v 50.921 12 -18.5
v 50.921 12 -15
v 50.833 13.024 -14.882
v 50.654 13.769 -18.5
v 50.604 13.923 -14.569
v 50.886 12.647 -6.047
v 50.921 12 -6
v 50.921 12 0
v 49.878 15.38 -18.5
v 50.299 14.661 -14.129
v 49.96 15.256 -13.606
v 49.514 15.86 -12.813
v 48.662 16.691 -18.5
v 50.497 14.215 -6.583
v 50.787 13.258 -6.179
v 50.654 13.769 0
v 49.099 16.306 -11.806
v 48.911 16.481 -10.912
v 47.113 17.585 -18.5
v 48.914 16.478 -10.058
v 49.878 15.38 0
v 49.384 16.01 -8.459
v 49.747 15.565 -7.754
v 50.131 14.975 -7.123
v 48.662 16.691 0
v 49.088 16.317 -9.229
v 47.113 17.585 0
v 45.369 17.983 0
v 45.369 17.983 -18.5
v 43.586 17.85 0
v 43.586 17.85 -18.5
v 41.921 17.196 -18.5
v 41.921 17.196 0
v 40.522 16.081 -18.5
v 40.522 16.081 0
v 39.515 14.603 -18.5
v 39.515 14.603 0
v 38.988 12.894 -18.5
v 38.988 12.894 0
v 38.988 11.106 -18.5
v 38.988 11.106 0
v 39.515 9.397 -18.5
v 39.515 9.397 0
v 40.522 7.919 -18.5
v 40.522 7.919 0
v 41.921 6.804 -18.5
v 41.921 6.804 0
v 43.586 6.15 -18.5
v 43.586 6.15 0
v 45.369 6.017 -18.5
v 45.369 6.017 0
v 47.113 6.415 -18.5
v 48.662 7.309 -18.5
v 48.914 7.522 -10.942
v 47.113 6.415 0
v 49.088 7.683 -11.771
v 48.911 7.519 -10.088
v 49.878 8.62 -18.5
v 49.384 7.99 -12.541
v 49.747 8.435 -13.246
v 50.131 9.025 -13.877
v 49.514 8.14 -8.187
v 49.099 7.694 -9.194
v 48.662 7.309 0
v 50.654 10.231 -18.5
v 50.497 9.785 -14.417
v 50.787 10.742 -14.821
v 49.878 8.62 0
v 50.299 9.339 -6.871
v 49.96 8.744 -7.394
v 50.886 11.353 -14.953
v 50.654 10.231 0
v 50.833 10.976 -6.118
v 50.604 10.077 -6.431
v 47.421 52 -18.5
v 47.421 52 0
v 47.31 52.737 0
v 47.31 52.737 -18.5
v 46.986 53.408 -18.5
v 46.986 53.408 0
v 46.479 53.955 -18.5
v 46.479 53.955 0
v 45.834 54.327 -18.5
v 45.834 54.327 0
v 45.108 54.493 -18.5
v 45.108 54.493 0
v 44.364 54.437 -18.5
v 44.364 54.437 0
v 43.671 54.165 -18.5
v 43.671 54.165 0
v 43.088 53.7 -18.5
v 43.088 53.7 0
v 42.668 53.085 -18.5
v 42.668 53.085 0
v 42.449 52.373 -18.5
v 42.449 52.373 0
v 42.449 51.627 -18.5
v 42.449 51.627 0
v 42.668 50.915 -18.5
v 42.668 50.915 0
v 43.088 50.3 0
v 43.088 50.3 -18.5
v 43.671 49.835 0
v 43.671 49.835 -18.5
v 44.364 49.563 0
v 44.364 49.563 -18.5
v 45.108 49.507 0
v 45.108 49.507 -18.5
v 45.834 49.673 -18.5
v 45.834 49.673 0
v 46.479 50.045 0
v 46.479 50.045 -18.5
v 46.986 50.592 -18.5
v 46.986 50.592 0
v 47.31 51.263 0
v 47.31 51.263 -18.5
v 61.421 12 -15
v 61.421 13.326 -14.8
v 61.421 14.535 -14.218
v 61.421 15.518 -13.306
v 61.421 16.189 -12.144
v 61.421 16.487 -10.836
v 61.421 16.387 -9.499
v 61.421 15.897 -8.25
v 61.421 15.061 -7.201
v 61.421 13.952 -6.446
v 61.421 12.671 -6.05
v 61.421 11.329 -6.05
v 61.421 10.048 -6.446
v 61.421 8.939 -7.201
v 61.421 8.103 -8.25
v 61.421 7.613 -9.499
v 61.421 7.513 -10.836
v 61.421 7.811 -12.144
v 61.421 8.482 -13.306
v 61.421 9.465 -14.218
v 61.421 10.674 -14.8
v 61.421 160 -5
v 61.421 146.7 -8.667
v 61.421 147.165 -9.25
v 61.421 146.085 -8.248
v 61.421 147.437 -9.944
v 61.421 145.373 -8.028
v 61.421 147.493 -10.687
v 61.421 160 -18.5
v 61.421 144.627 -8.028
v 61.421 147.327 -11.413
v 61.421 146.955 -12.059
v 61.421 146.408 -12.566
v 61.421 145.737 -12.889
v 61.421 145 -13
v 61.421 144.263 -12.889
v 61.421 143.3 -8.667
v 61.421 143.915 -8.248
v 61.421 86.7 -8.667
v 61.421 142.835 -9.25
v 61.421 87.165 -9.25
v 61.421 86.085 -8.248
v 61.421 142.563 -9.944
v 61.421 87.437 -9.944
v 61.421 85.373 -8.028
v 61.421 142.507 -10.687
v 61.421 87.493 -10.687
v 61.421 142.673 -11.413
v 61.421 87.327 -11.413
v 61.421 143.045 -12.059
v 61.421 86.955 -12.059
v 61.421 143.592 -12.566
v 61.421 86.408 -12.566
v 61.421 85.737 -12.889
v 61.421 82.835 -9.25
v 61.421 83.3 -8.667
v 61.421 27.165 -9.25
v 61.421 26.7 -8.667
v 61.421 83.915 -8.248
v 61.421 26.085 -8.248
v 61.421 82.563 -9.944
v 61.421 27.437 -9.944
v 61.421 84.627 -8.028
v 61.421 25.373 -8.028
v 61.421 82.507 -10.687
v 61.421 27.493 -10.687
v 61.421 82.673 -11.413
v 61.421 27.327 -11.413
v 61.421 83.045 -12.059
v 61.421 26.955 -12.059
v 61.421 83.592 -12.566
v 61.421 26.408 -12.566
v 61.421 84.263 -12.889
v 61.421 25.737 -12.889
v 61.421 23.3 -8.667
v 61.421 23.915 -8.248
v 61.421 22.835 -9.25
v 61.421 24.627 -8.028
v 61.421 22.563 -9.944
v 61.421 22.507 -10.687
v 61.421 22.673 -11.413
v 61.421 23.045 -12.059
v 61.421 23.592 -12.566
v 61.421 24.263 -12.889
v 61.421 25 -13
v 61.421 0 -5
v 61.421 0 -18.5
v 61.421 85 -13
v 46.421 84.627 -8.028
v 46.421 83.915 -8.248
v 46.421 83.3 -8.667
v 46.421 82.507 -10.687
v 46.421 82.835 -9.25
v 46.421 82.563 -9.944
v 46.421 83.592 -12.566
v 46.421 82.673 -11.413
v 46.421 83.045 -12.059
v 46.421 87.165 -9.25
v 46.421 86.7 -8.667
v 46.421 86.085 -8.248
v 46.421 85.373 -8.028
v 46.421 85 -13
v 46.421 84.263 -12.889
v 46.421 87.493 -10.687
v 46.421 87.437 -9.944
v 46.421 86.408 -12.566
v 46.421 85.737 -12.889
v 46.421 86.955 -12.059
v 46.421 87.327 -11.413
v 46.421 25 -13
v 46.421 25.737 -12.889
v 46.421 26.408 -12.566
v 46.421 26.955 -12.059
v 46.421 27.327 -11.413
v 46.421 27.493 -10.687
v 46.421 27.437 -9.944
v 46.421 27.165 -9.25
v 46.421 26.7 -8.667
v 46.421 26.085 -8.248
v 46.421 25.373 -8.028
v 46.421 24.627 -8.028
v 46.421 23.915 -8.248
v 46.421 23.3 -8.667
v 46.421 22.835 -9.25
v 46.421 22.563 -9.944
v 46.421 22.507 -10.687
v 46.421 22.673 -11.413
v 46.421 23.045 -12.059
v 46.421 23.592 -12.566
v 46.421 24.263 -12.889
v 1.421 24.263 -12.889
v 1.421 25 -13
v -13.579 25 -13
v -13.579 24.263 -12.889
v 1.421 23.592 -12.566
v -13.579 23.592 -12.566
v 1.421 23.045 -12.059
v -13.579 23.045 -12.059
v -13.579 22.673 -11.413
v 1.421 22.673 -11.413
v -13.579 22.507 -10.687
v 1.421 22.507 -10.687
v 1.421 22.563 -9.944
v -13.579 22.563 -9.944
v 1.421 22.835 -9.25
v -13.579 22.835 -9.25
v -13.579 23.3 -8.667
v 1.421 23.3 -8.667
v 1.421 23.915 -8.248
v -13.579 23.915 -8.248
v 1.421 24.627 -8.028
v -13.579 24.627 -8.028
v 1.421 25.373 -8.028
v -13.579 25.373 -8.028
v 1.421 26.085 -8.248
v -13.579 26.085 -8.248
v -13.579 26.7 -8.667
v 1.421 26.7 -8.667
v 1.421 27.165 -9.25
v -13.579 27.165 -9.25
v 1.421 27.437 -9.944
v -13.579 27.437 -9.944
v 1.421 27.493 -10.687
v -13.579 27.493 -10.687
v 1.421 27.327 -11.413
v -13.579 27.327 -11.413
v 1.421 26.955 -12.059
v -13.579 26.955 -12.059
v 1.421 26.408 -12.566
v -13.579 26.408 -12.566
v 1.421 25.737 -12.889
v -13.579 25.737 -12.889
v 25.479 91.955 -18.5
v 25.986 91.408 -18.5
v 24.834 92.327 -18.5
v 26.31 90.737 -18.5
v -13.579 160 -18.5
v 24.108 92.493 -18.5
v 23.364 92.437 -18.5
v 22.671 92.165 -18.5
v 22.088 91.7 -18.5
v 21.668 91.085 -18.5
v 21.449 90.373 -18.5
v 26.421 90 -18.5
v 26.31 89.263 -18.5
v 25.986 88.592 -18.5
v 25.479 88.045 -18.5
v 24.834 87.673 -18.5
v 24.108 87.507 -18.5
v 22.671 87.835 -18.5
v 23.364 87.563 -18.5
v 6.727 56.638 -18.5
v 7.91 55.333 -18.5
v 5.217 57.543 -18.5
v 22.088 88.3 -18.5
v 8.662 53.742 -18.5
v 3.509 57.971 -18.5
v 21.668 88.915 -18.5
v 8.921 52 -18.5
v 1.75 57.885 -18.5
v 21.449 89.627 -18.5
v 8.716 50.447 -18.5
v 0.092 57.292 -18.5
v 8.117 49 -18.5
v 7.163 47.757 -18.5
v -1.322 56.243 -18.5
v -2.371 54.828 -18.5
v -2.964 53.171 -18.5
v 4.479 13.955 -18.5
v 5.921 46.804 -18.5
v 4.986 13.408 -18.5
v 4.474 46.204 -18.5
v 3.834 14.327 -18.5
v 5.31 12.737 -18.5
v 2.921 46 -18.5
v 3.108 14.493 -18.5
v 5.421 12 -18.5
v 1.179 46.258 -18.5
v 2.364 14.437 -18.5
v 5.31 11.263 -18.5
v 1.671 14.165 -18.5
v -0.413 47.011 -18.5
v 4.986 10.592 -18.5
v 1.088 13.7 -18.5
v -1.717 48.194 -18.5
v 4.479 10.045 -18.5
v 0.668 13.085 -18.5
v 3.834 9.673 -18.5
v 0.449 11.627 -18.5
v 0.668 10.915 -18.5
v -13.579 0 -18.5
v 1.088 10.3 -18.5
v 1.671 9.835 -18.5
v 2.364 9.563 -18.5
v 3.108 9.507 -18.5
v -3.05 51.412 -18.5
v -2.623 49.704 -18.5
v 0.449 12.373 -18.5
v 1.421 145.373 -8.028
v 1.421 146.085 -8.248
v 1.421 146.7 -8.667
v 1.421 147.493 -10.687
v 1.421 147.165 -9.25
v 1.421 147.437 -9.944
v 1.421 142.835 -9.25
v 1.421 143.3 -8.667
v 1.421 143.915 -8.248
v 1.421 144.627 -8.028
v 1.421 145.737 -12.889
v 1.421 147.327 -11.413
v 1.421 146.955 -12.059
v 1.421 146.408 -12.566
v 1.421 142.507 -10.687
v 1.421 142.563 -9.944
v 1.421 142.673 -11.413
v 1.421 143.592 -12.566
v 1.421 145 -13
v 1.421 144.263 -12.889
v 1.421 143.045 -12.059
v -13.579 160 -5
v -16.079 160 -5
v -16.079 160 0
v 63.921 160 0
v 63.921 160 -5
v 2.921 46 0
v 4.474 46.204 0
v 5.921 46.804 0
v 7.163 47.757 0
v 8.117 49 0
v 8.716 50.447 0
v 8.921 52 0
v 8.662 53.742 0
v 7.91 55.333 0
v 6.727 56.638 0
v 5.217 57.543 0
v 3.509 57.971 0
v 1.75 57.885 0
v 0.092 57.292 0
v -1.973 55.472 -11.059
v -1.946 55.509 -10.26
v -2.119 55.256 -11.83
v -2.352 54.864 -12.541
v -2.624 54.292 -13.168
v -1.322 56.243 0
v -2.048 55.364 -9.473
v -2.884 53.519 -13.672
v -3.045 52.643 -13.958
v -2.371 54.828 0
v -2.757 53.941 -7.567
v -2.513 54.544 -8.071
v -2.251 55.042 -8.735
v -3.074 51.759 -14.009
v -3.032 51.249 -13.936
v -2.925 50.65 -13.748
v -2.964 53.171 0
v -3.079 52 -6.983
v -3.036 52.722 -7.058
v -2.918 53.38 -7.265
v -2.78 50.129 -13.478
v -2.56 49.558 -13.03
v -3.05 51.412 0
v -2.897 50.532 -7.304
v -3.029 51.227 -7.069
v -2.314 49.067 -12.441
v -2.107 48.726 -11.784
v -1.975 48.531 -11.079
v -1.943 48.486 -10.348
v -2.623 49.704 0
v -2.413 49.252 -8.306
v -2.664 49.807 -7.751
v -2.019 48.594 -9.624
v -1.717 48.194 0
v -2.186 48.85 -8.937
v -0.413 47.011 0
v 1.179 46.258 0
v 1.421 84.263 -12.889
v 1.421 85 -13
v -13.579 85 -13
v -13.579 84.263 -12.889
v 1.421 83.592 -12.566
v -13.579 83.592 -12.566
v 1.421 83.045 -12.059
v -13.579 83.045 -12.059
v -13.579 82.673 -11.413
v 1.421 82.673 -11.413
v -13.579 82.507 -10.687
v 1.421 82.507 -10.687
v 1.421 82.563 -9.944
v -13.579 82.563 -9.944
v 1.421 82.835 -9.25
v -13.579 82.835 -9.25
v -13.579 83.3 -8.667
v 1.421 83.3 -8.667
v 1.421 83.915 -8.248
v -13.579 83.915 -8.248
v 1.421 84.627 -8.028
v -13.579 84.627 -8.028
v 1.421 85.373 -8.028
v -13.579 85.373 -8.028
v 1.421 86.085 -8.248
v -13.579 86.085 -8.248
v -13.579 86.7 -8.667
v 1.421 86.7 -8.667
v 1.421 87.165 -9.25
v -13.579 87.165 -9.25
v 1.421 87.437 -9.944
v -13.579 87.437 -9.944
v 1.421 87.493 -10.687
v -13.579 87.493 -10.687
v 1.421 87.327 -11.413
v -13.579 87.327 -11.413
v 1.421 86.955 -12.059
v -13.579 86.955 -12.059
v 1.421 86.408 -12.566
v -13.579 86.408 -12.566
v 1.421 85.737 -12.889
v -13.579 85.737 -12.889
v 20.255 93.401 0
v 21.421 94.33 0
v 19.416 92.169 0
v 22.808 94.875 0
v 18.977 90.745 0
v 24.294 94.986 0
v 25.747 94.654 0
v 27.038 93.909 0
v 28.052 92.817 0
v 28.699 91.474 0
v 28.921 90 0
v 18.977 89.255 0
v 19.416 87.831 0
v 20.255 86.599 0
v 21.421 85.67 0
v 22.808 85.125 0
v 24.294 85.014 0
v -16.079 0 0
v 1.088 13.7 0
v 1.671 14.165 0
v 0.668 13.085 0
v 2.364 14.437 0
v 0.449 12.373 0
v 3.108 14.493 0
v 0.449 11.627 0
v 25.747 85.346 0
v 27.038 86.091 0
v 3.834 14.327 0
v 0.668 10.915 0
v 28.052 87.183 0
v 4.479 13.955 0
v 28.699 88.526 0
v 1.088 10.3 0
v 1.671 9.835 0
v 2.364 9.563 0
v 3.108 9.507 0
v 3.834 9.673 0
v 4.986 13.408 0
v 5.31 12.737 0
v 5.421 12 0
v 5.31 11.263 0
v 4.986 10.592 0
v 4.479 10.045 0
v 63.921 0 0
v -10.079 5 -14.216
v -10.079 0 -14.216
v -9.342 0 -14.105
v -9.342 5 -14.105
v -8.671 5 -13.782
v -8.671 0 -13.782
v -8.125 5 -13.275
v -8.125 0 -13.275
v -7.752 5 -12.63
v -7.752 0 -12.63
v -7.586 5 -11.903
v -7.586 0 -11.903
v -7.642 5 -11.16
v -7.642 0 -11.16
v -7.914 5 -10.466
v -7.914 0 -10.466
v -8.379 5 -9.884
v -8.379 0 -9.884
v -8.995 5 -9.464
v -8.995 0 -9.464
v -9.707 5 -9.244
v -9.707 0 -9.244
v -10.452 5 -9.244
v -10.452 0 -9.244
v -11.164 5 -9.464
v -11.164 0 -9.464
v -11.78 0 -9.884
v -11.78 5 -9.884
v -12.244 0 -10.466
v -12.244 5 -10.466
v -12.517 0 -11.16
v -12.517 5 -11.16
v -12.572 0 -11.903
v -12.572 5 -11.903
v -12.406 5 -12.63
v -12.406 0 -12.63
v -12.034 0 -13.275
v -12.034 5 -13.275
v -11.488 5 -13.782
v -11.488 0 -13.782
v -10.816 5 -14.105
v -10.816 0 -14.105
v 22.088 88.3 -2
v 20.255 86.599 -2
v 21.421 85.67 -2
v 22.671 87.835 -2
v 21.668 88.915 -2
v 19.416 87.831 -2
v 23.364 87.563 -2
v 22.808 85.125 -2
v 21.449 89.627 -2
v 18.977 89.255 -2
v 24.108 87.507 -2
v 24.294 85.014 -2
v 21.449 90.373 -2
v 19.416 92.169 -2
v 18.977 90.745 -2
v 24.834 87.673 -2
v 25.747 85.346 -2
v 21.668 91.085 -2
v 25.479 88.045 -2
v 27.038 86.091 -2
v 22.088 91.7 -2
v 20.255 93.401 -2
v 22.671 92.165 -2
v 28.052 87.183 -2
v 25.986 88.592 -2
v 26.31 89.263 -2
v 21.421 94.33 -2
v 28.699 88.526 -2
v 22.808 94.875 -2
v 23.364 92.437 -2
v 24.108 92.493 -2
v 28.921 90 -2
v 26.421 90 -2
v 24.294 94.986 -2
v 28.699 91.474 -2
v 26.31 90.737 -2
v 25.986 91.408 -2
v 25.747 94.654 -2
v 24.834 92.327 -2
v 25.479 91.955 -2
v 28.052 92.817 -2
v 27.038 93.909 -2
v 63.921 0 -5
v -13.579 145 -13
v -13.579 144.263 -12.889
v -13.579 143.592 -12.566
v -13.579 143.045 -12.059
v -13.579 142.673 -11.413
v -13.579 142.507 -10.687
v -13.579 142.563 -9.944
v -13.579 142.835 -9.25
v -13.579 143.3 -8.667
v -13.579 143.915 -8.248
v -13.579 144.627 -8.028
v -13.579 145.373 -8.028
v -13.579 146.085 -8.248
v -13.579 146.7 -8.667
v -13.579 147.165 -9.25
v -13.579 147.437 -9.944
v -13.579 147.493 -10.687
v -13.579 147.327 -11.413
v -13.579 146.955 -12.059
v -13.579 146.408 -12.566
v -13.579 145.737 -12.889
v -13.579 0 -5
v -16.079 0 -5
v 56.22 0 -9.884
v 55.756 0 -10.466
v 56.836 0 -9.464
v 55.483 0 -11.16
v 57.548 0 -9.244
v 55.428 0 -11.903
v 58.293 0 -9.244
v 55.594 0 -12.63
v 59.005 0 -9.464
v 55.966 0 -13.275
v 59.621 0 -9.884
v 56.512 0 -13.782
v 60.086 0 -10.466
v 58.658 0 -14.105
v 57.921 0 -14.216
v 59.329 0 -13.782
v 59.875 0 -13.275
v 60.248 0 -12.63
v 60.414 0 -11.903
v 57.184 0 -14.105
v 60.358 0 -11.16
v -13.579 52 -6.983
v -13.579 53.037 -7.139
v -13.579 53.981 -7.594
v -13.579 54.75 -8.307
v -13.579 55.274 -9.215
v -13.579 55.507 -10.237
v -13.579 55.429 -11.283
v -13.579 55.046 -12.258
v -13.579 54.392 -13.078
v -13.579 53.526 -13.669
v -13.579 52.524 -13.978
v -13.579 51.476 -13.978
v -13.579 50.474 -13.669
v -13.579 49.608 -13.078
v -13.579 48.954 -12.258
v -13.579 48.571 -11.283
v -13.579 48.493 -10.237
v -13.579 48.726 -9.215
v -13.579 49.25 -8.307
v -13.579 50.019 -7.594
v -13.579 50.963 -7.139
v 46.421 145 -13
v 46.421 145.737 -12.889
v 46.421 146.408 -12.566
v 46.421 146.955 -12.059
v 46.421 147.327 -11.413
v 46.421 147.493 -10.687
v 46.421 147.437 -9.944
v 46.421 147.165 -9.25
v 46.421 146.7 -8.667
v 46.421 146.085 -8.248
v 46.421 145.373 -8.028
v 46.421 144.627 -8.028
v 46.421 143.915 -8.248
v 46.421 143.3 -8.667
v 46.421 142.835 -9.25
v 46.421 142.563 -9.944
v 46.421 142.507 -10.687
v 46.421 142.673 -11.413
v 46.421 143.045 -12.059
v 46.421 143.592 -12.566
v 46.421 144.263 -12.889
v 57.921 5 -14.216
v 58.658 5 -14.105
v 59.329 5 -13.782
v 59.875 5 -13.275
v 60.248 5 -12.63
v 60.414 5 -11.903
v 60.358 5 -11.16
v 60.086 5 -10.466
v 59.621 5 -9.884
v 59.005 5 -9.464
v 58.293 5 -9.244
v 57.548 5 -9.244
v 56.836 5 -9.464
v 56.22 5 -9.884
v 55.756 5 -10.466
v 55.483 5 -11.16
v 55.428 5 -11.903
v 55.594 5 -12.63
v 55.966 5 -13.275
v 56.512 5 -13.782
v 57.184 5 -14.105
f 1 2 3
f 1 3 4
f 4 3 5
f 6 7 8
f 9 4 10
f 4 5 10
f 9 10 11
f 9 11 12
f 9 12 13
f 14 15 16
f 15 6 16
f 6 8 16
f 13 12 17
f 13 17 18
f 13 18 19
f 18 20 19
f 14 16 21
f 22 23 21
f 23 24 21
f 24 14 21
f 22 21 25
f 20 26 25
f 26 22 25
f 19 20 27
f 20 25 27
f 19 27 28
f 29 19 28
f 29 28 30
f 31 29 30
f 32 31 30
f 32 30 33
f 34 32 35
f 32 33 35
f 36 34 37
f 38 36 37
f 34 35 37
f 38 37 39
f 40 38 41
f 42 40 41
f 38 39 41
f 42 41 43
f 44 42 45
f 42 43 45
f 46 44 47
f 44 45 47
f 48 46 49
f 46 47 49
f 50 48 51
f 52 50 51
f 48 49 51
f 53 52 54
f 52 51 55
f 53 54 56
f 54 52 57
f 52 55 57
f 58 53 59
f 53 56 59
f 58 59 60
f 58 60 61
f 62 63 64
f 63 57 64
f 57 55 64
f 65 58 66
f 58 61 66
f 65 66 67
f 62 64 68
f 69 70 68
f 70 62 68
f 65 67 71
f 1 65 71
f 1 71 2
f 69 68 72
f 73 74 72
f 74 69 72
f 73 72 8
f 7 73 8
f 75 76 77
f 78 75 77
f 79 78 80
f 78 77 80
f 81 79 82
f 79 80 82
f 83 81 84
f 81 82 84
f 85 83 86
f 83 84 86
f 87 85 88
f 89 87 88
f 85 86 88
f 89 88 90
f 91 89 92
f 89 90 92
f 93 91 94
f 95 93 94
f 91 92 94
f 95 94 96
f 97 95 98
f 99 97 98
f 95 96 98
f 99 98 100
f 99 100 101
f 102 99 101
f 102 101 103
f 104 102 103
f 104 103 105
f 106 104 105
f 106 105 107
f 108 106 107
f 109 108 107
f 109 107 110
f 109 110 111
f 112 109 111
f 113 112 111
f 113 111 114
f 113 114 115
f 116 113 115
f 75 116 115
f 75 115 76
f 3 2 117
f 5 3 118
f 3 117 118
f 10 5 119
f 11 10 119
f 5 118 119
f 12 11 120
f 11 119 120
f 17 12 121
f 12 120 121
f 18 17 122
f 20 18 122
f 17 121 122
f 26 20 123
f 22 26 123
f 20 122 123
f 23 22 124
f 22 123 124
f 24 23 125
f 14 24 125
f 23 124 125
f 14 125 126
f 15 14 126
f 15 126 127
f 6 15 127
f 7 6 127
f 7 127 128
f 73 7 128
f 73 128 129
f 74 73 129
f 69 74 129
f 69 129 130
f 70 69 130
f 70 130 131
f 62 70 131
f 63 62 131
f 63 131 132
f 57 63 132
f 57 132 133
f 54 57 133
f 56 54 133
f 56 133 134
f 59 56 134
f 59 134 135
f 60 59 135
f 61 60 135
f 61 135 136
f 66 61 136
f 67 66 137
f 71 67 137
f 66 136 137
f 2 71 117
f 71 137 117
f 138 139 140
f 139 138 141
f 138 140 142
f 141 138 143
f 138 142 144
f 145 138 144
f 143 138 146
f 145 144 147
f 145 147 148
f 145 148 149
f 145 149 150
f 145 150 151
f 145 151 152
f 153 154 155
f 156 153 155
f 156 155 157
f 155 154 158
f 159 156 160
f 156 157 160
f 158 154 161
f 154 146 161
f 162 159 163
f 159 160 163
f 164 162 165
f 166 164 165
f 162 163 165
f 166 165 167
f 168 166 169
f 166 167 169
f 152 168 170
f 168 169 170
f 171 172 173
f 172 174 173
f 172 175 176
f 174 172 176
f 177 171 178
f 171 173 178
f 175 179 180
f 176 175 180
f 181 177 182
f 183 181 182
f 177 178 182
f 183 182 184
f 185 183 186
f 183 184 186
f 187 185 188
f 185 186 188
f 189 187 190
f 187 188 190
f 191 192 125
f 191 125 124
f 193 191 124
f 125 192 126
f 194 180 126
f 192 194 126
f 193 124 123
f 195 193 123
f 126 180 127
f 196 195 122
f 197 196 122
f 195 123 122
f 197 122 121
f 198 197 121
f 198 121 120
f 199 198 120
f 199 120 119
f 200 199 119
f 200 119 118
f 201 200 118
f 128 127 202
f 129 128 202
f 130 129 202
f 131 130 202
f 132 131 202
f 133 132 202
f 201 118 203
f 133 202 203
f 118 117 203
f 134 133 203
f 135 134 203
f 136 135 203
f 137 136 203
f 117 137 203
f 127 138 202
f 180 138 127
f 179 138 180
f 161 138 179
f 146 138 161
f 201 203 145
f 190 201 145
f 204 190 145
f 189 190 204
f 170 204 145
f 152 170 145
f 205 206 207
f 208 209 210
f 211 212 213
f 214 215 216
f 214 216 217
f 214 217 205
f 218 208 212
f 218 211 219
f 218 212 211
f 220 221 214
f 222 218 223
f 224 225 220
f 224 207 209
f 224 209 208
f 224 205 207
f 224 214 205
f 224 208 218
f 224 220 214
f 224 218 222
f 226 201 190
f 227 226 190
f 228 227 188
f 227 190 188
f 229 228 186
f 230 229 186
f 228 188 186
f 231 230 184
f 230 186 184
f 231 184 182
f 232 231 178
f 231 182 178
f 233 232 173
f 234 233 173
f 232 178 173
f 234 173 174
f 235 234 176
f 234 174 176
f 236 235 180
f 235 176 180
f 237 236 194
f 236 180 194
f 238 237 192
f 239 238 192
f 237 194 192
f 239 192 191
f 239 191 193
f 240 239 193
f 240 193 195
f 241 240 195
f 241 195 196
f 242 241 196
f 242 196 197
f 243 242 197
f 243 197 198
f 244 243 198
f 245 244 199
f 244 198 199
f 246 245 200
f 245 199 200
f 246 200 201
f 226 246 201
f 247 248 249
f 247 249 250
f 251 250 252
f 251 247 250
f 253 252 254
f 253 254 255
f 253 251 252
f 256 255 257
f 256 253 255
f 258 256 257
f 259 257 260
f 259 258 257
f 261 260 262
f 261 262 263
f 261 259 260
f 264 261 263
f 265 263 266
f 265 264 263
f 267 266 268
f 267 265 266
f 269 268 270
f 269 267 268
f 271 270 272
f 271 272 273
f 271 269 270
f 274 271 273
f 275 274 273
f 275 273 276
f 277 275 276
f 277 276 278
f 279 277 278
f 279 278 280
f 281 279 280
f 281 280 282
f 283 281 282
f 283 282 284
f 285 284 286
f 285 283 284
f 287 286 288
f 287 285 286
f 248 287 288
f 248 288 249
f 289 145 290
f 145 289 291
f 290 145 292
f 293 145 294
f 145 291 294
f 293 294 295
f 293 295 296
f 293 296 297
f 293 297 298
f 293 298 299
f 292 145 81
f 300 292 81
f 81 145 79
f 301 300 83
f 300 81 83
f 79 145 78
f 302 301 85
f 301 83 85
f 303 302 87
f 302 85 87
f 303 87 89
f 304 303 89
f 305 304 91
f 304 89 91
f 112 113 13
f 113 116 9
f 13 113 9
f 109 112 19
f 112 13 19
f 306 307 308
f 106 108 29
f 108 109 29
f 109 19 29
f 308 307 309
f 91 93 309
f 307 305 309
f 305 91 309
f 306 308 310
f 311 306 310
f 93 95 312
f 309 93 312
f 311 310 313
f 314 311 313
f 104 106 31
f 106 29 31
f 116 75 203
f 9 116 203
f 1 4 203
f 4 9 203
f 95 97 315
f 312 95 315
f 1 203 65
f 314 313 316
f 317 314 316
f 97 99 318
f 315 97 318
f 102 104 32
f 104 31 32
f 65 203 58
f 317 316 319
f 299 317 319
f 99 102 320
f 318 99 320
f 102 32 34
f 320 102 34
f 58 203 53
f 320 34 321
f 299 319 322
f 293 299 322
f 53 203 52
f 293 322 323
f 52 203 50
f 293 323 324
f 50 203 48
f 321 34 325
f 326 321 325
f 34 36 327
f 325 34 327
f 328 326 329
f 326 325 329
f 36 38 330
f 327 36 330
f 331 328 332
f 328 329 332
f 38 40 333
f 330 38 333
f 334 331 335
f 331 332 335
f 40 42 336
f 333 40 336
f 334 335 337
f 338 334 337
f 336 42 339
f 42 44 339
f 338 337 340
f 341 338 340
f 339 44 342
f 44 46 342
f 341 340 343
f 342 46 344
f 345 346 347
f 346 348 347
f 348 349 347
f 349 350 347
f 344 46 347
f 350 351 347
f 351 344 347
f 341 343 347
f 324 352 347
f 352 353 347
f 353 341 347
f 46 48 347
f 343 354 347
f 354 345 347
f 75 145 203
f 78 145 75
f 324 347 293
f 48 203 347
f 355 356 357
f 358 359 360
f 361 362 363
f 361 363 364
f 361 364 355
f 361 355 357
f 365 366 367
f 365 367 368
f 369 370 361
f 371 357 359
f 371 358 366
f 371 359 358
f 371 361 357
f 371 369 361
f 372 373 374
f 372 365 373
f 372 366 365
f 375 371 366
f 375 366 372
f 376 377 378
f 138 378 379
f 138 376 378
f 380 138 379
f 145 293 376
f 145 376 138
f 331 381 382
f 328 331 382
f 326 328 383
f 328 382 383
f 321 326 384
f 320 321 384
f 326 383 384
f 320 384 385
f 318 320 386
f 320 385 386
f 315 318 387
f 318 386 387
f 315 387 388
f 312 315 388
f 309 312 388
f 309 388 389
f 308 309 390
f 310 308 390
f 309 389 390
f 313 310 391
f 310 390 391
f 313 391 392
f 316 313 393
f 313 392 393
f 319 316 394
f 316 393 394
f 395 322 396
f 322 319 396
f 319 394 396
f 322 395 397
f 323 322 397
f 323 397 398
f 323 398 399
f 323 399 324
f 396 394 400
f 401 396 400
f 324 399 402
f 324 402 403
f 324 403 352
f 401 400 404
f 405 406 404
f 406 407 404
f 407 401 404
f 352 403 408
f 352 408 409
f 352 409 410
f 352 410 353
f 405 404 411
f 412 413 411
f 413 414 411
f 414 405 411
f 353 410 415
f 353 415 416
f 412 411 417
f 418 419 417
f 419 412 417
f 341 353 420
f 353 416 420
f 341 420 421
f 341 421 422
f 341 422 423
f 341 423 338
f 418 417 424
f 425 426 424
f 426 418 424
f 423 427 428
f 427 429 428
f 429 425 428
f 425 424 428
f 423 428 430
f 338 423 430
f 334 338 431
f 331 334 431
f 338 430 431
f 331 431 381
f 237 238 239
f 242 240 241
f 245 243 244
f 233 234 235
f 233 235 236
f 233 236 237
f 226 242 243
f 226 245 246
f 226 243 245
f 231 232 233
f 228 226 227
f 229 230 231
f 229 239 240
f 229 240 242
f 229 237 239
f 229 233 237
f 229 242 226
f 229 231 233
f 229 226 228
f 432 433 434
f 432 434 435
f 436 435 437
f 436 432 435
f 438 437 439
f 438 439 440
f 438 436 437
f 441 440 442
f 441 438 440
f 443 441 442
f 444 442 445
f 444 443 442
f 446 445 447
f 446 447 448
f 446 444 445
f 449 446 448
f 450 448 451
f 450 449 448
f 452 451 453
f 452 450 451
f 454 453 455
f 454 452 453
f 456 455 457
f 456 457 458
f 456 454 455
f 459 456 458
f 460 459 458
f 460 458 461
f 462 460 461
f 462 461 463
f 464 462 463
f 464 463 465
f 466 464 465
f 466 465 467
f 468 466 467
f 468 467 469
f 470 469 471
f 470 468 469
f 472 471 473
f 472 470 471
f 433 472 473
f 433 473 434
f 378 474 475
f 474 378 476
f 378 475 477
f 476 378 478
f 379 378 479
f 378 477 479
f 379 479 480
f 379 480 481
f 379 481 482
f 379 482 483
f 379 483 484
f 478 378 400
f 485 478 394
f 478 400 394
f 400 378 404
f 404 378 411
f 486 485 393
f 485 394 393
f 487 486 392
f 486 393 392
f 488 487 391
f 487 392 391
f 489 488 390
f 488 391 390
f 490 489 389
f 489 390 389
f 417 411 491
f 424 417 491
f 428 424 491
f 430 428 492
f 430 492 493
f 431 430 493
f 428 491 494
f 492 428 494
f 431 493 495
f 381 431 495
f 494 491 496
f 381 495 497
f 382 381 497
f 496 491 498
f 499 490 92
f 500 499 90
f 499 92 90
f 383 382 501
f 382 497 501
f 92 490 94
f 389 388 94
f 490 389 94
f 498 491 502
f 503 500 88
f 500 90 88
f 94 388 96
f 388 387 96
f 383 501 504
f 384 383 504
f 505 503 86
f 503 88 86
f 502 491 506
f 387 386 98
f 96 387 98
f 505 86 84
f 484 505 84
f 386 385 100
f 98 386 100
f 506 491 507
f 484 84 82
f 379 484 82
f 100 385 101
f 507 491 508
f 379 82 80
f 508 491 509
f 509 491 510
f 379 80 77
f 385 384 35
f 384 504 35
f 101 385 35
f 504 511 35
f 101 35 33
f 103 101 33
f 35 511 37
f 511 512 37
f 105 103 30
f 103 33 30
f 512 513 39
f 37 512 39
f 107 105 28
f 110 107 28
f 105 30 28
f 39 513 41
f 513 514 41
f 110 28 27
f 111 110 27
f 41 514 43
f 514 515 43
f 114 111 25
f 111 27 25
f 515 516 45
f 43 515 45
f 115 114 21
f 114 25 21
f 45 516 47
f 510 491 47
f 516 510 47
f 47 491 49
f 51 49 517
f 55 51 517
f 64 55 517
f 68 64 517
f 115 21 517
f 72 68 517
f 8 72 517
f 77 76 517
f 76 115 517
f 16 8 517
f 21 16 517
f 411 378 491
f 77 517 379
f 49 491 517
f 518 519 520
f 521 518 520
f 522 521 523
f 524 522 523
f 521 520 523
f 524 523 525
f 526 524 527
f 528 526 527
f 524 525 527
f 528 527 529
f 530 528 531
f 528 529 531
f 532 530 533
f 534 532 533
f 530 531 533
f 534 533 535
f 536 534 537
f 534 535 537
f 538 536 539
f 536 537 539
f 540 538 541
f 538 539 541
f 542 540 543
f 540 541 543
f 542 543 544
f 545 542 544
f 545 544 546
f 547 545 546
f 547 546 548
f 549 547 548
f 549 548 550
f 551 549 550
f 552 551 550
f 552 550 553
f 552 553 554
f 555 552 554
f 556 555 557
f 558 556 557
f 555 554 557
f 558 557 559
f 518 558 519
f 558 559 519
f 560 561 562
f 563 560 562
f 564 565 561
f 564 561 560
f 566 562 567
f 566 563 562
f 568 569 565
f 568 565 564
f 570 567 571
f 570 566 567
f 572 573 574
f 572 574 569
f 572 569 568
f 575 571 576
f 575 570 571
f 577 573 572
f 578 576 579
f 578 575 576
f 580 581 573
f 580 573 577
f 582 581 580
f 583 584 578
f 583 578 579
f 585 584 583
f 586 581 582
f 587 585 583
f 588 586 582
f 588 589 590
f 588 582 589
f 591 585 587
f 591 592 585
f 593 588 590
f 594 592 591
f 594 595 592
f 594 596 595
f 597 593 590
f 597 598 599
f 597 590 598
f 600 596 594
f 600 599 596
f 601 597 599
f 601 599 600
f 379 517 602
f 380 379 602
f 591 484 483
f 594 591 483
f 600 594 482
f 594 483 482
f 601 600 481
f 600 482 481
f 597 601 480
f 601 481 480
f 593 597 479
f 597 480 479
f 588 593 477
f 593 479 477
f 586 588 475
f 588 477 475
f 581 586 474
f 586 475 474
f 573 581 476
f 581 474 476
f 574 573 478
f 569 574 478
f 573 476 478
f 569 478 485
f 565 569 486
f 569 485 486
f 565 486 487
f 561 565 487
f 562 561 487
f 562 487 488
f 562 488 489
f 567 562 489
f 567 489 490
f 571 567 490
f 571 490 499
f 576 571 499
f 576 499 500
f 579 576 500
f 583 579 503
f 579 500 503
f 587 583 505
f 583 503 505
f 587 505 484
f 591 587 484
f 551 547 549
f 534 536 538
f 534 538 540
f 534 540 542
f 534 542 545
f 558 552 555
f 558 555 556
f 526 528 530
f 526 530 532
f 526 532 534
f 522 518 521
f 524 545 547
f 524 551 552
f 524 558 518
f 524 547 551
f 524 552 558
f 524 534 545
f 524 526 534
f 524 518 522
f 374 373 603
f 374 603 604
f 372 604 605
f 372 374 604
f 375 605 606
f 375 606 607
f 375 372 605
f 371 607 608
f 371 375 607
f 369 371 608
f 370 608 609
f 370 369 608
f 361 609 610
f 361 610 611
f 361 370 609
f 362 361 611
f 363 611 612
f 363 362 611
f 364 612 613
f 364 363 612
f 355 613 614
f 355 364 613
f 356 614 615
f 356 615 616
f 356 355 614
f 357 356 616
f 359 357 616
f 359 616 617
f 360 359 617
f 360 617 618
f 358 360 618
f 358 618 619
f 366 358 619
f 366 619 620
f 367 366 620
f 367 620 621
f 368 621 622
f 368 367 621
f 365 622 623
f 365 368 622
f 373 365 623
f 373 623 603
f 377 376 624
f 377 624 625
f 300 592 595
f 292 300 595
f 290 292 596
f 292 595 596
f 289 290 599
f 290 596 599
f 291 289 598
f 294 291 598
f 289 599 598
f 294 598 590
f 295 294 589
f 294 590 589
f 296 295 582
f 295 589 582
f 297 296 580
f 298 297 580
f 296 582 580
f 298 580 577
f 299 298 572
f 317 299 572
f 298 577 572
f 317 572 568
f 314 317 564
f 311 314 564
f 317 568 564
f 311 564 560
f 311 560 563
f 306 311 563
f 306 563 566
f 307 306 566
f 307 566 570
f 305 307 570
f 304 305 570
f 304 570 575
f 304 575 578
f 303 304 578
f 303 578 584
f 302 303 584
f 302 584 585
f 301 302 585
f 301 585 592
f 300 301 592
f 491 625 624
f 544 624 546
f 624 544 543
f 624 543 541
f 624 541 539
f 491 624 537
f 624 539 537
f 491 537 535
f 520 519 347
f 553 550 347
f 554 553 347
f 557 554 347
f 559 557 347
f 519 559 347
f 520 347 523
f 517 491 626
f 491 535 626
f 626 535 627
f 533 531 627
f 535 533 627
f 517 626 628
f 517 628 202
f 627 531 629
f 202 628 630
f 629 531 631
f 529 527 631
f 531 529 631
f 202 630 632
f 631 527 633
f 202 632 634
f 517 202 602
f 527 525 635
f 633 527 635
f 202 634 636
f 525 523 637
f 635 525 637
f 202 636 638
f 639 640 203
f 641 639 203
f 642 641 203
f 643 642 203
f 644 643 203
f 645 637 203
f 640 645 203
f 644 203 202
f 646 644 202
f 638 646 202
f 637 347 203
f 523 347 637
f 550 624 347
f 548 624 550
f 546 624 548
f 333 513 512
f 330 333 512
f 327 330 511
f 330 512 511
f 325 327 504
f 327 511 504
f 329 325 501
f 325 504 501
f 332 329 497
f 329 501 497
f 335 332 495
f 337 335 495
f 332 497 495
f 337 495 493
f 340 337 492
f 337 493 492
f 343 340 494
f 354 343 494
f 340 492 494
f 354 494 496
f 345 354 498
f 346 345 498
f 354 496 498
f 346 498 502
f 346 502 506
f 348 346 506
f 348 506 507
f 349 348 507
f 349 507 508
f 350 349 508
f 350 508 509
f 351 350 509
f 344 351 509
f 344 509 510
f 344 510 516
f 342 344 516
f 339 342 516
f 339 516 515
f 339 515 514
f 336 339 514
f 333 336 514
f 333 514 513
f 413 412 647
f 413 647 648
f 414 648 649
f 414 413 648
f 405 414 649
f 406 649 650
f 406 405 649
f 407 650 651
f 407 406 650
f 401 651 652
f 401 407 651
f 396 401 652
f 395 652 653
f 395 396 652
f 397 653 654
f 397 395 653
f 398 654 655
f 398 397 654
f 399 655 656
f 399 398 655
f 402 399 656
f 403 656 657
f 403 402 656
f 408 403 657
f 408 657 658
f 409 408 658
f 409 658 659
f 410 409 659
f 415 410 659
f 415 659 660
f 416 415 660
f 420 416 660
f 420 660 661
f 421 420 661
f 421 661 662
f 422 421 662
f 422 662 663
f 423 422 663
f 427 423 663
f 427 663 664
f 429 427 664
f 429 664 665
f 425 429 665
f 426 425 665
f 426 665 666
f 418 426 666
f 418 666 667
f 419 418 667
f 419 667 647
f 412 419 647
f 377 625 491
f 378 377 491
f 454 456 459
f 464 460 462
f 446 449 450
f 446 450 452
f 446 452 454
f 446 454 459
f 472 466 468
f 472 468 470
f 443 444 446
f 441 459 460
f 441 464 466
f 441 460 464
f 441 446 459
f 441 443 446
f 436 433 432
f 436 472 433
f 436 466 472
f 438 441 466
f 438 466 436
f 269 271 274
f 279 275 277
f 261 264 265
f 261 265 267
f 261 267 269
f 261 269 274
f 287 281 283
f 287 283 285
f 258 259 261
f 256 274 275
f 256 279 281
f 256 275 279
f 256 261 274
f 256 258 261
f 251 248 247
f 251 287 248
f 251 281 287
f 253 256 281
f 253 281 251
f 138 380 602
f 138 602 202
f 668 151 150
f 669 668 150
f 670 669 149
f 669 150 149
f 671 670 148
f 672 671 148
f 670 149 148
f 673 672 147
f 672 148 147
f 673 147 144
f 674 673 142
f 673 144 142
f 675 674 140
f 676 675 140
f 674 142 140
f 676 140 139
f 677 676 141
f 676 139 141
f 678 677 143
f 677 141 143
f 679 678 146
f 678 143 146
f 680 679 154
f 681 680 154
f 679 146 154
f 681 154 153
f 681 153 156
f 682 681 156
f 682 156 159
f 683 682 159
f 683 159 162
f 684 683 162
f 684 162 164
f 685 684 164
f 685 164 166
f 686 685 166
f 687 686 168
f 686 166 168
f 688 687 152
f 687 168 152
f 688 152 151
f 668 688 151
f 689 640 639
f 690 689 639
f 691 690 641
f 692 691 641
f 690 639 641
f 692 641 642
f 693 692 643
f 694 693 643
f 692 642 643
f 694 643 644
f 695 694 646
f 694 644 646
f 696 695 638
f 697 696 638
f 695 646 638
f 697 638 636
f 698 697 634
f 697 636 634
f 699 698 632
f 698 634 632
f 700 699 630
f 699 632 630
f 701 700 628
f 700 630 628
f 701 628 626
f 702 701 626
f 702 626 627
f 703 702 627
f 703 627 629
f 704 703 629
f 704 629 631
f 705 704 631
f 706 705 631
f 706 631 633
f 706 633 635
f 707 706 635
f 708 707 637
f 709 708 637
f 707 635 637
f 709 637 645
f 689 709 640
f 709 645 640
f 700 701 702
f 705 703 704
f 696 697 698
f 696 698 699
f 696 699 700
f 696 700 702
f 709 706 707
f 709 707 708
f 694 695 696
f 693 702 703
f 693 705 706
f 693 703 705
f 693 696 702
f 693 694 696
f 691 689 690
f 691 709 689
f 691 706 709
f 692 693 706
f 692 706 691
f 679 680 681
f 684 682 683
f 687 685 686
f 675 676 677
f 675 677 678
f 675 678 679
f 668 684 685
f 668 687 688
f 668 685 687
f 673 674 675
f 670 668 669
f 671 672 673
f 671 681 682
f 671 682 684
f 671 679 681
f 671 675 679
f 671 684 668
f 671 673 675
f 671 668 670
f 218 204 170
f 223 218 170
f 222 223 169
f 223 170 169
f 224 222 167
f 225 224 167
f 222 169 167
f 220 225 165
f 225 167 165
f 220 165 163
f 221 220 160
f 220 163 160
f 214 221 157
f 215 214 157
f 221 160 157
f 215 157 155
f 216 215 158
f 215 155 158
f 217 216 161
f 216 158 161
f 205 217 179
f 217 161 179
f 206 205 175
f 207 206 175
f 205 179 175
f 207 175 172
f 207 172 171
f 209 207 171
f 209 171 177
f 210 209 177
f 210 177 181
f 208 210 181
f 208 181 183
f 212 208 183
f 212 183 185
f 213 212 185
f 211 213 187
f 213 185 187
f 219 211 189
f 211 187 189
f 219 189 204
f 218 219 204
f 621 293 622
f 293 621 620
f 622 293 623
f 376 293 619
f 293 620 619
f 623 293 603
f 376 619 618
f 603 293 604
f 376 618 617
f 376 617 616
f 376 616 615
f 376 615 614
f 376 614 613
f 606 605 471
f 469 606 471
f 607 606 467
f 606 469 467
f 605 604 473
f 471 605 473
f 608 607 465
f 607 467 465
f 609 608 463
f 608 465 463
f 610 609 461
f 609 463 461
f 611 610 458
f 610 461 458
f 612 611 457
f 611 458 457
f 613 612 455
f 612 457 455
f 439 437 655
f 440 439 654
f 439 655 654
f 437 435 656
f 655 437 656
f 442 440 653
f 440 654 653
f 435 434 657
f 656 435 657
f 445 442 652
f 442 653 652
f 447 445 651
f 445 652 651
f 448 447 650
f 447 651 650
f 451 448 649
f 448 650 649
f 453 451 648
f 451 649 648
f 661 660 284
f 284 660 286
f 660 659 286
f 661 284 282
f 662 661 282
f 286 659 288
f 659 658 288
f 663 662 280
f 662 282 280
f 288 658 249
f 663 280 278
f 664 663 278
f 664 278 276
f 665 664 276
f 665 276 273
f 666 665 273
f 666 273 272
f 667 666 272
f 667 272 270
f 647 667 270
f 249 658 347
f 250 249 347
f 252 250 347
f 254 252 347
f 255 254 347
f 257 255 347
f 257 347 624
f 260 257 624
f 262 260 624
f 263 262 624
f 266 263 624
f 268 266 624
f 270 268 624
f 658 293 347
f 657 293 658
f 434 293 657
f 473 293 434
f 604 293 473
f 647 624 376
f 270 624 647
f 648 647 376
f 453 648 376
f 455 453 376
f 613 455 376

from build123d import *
from OCP.BRepAlgoAPI import BRepAlgoAPI_Cut
from OCP.TopTools import TopTools_ListOfShape

# Parameters (mm, degrees)
BOSS_EXTRUDE1_DEPTH = 160
SKETCH2_R           = 5
CUT_EXTRUDE1_DEPTH  = 2
SKETCH3_R           = 2.5
CUT_EXTRUDE2_DEPTH  = 174.084103307
SKETCH4_R           = 2.5
SKETCH4_R_2         = 6
CUT_EXTRUDE3_DEPTH  = 174.286199049
SKETCH5_R           = 2.5
CUT_EXTRUDE4_DEPTH  = 5
SKETCH6_R           = 2.5
SKETCH6_R_2         = 4.5
CUT_EXTRUDE5_DEPTH  = 15
CUT_EXTRUDE6_START  = -15
SKETCH7_R           = 2.5
SKETCH7_R_2         = 3.51695151
CUT_EXTRUDE6_DEPTH  = 15


with BuildPart() as part:
    # Sketch1 → Boss-Extrude1 (new body)
    with BuildSketch(Plane(origin=(0, 0, 0), x_dir=(1, 0, 0), z_dir=(0, 1, 0))):
        Polygon((-16.079290349, -9.231e-06), (63.920709651, -9.231e-06), (63.920709651, 4.999990769), (61.420709651, 4.999990769), (61.420709651, 18.499990769), (-13.579290349, 18.499990769), (-13.579290349, 4.999990769), (-16.079290349, 4.999990769), align=None)
    extrude(amount=BOSS_EXTRUDE1_DEPTH)


with BuildPart() as cut_extrude1_tool:
    # Sketch2 → Cut-Extrude1 (new body)
    with BuildSketch(Plane.XY):
        with Locations((23.920709651, 90)):
            Circle(SKETCH2_R)
    extrude(amount=-CUT_EXTRUDE1_DEPTH)


with BuildPart() as part_1:
    add(part.part)

    # Cut-Extrude1: cut by cut_extrude1_tool, with a tolerance
    cut_extrude1_stock = TopTools_ListOfShape()
    cut_extrude1_stock.Append(part_1.part.wrapped)
    cut_extrude1_tools = TopTools_ListOfShape()
    cut_extrude1_tools.Append(cut_extrude1_tool.part.wrapped)
    cut_extrude1_cut = BRepAlgoAPI_Cut()
    cut_extrude1_cut.SetArguments(cut_extrude1_stock)
    cut_extrude1_cut.SetTools(cut_extrude1_tools)
    cut_extrude1_cut.SetFuzzyValue(0.00001)
    cut_extrude1_cut.Build()
    add(Compound.cast(cut_extrude1_cut.Shape()).solids(), mode=Mode.REPLACE)

    # Sketch3 → Cut-Extrude2 (cut, through all)
    with BuildSketch(Plane.XY.offset(-2)):
        with Locations((23.920709651, 90)):
            Circle(SKETCH3_R)
    extrude(amount=-CUT_EXTRUDE2_DEPTH, mode=Mode.SUBTRACT)


with BuildPart() as cut_extrude3_tool:
    # Sketch4 → Cut-Extrude3 (new, through all)
    with BuildSketch(Plane.XY):
        with Locations((2.920709651, 12)):
            Circle(SKETCH4_R)
        with Locations((44.920709651, 12)):
            Circle(SKETCH4_R_2)
        with Locations((2.920709651, 52)):
            Circle(SKETCH4_R_2)
        with Locations((44.920709651, 52)):
            Circle(SKETCH4_R)
    extrude(amount=-CUT_EXTRUDE3_DEPTH)


with BuildPart() as part_2:
    add(part_1.part)

    # Cut-Extrude3: cut by cut_extrude3_tool, with a tolerance
    cut_extrude3_stock = TopTools_ListOfShape()
    cut_extrude3_stock.Append(part_2.part.wrapped)
    cut_extrude3_tools = TopTools_ListOfShape()
    cut_extrude3_tools.Append(cut_extrude3_tool.part.wrapped)
    cut_extrude3_cut = BRepAlgoAPI_Cut()
    cut_extrude3_cut.SetArguments(cut_extrude3_stock)
    cut_extrude3_cut.SetTools(cut_extrude3_tools)
    cut_extrude3_cut.SetFuzzyValue(0.00001)
    cut_extrude3_cut.Build()
    add(Compound.cast(cut_extrude3_cut.Shape()).solids(), mode=Mode.REPLACE)

    # Sketch5 → Cut-Extrude4 (cut)
    with BuildSketch(Plane.XZ):
        with Locations((57.920709651, -11.71640591)):
            Circle(SKETCH5_R)
        with Locations((-10.079290349, -11.71640591)):
            Circle(SKETCH5_R)
    extrude(amount=-CUT_EXTRUDE4_DEPTH, mode=Mode.SUBTRACT)

    # Sketch6 → Cut-Extrude5 (cut)
    with BuildSketch(Plane(origin=(61.420709651, 0, 0), x_dir=(0, 0, -1), z_dir=(1, 0, 0))):
        with Locations((10.499990769, 145)):
            Circle(SKETCH6_R)
        with Locations((10.499990769, 85)):
            Circle(SKETCH6_R)
        with Locations((10.499990769, 25)):
            Circle(SKETCH6_R)
        with Locations((10.499990769, 12)):
            Circle(SKETCH6_R_2)
    extrude(amount=-CUT_EXTRUDE5_DEPTH, mode=Mode.SUBTRACT)

    # Sketch7 → Cut-Extrude6 (cut)
    with BuildSketch(Plane.ZY.offset(13.579290349).offset(CUT_EXTRUDE6_START)):
        with Locations((-10.499990769, 145)):
            Circle(SKETCH7_R)
        with Locations((-10.499990769, 85)):
            Circle(SKETCH7_R)
        with Locations((-10.499990769, 25)):
            Circle(SKETCH7_R)
        with Locations((-10.499990769, 52)):
            Circle(SKETCH7_R_2)
    extrude(amount=CUT_EXTRUDE6_DEPTH, mode=Mode.SUBTRACT)


solid = part_2.part
